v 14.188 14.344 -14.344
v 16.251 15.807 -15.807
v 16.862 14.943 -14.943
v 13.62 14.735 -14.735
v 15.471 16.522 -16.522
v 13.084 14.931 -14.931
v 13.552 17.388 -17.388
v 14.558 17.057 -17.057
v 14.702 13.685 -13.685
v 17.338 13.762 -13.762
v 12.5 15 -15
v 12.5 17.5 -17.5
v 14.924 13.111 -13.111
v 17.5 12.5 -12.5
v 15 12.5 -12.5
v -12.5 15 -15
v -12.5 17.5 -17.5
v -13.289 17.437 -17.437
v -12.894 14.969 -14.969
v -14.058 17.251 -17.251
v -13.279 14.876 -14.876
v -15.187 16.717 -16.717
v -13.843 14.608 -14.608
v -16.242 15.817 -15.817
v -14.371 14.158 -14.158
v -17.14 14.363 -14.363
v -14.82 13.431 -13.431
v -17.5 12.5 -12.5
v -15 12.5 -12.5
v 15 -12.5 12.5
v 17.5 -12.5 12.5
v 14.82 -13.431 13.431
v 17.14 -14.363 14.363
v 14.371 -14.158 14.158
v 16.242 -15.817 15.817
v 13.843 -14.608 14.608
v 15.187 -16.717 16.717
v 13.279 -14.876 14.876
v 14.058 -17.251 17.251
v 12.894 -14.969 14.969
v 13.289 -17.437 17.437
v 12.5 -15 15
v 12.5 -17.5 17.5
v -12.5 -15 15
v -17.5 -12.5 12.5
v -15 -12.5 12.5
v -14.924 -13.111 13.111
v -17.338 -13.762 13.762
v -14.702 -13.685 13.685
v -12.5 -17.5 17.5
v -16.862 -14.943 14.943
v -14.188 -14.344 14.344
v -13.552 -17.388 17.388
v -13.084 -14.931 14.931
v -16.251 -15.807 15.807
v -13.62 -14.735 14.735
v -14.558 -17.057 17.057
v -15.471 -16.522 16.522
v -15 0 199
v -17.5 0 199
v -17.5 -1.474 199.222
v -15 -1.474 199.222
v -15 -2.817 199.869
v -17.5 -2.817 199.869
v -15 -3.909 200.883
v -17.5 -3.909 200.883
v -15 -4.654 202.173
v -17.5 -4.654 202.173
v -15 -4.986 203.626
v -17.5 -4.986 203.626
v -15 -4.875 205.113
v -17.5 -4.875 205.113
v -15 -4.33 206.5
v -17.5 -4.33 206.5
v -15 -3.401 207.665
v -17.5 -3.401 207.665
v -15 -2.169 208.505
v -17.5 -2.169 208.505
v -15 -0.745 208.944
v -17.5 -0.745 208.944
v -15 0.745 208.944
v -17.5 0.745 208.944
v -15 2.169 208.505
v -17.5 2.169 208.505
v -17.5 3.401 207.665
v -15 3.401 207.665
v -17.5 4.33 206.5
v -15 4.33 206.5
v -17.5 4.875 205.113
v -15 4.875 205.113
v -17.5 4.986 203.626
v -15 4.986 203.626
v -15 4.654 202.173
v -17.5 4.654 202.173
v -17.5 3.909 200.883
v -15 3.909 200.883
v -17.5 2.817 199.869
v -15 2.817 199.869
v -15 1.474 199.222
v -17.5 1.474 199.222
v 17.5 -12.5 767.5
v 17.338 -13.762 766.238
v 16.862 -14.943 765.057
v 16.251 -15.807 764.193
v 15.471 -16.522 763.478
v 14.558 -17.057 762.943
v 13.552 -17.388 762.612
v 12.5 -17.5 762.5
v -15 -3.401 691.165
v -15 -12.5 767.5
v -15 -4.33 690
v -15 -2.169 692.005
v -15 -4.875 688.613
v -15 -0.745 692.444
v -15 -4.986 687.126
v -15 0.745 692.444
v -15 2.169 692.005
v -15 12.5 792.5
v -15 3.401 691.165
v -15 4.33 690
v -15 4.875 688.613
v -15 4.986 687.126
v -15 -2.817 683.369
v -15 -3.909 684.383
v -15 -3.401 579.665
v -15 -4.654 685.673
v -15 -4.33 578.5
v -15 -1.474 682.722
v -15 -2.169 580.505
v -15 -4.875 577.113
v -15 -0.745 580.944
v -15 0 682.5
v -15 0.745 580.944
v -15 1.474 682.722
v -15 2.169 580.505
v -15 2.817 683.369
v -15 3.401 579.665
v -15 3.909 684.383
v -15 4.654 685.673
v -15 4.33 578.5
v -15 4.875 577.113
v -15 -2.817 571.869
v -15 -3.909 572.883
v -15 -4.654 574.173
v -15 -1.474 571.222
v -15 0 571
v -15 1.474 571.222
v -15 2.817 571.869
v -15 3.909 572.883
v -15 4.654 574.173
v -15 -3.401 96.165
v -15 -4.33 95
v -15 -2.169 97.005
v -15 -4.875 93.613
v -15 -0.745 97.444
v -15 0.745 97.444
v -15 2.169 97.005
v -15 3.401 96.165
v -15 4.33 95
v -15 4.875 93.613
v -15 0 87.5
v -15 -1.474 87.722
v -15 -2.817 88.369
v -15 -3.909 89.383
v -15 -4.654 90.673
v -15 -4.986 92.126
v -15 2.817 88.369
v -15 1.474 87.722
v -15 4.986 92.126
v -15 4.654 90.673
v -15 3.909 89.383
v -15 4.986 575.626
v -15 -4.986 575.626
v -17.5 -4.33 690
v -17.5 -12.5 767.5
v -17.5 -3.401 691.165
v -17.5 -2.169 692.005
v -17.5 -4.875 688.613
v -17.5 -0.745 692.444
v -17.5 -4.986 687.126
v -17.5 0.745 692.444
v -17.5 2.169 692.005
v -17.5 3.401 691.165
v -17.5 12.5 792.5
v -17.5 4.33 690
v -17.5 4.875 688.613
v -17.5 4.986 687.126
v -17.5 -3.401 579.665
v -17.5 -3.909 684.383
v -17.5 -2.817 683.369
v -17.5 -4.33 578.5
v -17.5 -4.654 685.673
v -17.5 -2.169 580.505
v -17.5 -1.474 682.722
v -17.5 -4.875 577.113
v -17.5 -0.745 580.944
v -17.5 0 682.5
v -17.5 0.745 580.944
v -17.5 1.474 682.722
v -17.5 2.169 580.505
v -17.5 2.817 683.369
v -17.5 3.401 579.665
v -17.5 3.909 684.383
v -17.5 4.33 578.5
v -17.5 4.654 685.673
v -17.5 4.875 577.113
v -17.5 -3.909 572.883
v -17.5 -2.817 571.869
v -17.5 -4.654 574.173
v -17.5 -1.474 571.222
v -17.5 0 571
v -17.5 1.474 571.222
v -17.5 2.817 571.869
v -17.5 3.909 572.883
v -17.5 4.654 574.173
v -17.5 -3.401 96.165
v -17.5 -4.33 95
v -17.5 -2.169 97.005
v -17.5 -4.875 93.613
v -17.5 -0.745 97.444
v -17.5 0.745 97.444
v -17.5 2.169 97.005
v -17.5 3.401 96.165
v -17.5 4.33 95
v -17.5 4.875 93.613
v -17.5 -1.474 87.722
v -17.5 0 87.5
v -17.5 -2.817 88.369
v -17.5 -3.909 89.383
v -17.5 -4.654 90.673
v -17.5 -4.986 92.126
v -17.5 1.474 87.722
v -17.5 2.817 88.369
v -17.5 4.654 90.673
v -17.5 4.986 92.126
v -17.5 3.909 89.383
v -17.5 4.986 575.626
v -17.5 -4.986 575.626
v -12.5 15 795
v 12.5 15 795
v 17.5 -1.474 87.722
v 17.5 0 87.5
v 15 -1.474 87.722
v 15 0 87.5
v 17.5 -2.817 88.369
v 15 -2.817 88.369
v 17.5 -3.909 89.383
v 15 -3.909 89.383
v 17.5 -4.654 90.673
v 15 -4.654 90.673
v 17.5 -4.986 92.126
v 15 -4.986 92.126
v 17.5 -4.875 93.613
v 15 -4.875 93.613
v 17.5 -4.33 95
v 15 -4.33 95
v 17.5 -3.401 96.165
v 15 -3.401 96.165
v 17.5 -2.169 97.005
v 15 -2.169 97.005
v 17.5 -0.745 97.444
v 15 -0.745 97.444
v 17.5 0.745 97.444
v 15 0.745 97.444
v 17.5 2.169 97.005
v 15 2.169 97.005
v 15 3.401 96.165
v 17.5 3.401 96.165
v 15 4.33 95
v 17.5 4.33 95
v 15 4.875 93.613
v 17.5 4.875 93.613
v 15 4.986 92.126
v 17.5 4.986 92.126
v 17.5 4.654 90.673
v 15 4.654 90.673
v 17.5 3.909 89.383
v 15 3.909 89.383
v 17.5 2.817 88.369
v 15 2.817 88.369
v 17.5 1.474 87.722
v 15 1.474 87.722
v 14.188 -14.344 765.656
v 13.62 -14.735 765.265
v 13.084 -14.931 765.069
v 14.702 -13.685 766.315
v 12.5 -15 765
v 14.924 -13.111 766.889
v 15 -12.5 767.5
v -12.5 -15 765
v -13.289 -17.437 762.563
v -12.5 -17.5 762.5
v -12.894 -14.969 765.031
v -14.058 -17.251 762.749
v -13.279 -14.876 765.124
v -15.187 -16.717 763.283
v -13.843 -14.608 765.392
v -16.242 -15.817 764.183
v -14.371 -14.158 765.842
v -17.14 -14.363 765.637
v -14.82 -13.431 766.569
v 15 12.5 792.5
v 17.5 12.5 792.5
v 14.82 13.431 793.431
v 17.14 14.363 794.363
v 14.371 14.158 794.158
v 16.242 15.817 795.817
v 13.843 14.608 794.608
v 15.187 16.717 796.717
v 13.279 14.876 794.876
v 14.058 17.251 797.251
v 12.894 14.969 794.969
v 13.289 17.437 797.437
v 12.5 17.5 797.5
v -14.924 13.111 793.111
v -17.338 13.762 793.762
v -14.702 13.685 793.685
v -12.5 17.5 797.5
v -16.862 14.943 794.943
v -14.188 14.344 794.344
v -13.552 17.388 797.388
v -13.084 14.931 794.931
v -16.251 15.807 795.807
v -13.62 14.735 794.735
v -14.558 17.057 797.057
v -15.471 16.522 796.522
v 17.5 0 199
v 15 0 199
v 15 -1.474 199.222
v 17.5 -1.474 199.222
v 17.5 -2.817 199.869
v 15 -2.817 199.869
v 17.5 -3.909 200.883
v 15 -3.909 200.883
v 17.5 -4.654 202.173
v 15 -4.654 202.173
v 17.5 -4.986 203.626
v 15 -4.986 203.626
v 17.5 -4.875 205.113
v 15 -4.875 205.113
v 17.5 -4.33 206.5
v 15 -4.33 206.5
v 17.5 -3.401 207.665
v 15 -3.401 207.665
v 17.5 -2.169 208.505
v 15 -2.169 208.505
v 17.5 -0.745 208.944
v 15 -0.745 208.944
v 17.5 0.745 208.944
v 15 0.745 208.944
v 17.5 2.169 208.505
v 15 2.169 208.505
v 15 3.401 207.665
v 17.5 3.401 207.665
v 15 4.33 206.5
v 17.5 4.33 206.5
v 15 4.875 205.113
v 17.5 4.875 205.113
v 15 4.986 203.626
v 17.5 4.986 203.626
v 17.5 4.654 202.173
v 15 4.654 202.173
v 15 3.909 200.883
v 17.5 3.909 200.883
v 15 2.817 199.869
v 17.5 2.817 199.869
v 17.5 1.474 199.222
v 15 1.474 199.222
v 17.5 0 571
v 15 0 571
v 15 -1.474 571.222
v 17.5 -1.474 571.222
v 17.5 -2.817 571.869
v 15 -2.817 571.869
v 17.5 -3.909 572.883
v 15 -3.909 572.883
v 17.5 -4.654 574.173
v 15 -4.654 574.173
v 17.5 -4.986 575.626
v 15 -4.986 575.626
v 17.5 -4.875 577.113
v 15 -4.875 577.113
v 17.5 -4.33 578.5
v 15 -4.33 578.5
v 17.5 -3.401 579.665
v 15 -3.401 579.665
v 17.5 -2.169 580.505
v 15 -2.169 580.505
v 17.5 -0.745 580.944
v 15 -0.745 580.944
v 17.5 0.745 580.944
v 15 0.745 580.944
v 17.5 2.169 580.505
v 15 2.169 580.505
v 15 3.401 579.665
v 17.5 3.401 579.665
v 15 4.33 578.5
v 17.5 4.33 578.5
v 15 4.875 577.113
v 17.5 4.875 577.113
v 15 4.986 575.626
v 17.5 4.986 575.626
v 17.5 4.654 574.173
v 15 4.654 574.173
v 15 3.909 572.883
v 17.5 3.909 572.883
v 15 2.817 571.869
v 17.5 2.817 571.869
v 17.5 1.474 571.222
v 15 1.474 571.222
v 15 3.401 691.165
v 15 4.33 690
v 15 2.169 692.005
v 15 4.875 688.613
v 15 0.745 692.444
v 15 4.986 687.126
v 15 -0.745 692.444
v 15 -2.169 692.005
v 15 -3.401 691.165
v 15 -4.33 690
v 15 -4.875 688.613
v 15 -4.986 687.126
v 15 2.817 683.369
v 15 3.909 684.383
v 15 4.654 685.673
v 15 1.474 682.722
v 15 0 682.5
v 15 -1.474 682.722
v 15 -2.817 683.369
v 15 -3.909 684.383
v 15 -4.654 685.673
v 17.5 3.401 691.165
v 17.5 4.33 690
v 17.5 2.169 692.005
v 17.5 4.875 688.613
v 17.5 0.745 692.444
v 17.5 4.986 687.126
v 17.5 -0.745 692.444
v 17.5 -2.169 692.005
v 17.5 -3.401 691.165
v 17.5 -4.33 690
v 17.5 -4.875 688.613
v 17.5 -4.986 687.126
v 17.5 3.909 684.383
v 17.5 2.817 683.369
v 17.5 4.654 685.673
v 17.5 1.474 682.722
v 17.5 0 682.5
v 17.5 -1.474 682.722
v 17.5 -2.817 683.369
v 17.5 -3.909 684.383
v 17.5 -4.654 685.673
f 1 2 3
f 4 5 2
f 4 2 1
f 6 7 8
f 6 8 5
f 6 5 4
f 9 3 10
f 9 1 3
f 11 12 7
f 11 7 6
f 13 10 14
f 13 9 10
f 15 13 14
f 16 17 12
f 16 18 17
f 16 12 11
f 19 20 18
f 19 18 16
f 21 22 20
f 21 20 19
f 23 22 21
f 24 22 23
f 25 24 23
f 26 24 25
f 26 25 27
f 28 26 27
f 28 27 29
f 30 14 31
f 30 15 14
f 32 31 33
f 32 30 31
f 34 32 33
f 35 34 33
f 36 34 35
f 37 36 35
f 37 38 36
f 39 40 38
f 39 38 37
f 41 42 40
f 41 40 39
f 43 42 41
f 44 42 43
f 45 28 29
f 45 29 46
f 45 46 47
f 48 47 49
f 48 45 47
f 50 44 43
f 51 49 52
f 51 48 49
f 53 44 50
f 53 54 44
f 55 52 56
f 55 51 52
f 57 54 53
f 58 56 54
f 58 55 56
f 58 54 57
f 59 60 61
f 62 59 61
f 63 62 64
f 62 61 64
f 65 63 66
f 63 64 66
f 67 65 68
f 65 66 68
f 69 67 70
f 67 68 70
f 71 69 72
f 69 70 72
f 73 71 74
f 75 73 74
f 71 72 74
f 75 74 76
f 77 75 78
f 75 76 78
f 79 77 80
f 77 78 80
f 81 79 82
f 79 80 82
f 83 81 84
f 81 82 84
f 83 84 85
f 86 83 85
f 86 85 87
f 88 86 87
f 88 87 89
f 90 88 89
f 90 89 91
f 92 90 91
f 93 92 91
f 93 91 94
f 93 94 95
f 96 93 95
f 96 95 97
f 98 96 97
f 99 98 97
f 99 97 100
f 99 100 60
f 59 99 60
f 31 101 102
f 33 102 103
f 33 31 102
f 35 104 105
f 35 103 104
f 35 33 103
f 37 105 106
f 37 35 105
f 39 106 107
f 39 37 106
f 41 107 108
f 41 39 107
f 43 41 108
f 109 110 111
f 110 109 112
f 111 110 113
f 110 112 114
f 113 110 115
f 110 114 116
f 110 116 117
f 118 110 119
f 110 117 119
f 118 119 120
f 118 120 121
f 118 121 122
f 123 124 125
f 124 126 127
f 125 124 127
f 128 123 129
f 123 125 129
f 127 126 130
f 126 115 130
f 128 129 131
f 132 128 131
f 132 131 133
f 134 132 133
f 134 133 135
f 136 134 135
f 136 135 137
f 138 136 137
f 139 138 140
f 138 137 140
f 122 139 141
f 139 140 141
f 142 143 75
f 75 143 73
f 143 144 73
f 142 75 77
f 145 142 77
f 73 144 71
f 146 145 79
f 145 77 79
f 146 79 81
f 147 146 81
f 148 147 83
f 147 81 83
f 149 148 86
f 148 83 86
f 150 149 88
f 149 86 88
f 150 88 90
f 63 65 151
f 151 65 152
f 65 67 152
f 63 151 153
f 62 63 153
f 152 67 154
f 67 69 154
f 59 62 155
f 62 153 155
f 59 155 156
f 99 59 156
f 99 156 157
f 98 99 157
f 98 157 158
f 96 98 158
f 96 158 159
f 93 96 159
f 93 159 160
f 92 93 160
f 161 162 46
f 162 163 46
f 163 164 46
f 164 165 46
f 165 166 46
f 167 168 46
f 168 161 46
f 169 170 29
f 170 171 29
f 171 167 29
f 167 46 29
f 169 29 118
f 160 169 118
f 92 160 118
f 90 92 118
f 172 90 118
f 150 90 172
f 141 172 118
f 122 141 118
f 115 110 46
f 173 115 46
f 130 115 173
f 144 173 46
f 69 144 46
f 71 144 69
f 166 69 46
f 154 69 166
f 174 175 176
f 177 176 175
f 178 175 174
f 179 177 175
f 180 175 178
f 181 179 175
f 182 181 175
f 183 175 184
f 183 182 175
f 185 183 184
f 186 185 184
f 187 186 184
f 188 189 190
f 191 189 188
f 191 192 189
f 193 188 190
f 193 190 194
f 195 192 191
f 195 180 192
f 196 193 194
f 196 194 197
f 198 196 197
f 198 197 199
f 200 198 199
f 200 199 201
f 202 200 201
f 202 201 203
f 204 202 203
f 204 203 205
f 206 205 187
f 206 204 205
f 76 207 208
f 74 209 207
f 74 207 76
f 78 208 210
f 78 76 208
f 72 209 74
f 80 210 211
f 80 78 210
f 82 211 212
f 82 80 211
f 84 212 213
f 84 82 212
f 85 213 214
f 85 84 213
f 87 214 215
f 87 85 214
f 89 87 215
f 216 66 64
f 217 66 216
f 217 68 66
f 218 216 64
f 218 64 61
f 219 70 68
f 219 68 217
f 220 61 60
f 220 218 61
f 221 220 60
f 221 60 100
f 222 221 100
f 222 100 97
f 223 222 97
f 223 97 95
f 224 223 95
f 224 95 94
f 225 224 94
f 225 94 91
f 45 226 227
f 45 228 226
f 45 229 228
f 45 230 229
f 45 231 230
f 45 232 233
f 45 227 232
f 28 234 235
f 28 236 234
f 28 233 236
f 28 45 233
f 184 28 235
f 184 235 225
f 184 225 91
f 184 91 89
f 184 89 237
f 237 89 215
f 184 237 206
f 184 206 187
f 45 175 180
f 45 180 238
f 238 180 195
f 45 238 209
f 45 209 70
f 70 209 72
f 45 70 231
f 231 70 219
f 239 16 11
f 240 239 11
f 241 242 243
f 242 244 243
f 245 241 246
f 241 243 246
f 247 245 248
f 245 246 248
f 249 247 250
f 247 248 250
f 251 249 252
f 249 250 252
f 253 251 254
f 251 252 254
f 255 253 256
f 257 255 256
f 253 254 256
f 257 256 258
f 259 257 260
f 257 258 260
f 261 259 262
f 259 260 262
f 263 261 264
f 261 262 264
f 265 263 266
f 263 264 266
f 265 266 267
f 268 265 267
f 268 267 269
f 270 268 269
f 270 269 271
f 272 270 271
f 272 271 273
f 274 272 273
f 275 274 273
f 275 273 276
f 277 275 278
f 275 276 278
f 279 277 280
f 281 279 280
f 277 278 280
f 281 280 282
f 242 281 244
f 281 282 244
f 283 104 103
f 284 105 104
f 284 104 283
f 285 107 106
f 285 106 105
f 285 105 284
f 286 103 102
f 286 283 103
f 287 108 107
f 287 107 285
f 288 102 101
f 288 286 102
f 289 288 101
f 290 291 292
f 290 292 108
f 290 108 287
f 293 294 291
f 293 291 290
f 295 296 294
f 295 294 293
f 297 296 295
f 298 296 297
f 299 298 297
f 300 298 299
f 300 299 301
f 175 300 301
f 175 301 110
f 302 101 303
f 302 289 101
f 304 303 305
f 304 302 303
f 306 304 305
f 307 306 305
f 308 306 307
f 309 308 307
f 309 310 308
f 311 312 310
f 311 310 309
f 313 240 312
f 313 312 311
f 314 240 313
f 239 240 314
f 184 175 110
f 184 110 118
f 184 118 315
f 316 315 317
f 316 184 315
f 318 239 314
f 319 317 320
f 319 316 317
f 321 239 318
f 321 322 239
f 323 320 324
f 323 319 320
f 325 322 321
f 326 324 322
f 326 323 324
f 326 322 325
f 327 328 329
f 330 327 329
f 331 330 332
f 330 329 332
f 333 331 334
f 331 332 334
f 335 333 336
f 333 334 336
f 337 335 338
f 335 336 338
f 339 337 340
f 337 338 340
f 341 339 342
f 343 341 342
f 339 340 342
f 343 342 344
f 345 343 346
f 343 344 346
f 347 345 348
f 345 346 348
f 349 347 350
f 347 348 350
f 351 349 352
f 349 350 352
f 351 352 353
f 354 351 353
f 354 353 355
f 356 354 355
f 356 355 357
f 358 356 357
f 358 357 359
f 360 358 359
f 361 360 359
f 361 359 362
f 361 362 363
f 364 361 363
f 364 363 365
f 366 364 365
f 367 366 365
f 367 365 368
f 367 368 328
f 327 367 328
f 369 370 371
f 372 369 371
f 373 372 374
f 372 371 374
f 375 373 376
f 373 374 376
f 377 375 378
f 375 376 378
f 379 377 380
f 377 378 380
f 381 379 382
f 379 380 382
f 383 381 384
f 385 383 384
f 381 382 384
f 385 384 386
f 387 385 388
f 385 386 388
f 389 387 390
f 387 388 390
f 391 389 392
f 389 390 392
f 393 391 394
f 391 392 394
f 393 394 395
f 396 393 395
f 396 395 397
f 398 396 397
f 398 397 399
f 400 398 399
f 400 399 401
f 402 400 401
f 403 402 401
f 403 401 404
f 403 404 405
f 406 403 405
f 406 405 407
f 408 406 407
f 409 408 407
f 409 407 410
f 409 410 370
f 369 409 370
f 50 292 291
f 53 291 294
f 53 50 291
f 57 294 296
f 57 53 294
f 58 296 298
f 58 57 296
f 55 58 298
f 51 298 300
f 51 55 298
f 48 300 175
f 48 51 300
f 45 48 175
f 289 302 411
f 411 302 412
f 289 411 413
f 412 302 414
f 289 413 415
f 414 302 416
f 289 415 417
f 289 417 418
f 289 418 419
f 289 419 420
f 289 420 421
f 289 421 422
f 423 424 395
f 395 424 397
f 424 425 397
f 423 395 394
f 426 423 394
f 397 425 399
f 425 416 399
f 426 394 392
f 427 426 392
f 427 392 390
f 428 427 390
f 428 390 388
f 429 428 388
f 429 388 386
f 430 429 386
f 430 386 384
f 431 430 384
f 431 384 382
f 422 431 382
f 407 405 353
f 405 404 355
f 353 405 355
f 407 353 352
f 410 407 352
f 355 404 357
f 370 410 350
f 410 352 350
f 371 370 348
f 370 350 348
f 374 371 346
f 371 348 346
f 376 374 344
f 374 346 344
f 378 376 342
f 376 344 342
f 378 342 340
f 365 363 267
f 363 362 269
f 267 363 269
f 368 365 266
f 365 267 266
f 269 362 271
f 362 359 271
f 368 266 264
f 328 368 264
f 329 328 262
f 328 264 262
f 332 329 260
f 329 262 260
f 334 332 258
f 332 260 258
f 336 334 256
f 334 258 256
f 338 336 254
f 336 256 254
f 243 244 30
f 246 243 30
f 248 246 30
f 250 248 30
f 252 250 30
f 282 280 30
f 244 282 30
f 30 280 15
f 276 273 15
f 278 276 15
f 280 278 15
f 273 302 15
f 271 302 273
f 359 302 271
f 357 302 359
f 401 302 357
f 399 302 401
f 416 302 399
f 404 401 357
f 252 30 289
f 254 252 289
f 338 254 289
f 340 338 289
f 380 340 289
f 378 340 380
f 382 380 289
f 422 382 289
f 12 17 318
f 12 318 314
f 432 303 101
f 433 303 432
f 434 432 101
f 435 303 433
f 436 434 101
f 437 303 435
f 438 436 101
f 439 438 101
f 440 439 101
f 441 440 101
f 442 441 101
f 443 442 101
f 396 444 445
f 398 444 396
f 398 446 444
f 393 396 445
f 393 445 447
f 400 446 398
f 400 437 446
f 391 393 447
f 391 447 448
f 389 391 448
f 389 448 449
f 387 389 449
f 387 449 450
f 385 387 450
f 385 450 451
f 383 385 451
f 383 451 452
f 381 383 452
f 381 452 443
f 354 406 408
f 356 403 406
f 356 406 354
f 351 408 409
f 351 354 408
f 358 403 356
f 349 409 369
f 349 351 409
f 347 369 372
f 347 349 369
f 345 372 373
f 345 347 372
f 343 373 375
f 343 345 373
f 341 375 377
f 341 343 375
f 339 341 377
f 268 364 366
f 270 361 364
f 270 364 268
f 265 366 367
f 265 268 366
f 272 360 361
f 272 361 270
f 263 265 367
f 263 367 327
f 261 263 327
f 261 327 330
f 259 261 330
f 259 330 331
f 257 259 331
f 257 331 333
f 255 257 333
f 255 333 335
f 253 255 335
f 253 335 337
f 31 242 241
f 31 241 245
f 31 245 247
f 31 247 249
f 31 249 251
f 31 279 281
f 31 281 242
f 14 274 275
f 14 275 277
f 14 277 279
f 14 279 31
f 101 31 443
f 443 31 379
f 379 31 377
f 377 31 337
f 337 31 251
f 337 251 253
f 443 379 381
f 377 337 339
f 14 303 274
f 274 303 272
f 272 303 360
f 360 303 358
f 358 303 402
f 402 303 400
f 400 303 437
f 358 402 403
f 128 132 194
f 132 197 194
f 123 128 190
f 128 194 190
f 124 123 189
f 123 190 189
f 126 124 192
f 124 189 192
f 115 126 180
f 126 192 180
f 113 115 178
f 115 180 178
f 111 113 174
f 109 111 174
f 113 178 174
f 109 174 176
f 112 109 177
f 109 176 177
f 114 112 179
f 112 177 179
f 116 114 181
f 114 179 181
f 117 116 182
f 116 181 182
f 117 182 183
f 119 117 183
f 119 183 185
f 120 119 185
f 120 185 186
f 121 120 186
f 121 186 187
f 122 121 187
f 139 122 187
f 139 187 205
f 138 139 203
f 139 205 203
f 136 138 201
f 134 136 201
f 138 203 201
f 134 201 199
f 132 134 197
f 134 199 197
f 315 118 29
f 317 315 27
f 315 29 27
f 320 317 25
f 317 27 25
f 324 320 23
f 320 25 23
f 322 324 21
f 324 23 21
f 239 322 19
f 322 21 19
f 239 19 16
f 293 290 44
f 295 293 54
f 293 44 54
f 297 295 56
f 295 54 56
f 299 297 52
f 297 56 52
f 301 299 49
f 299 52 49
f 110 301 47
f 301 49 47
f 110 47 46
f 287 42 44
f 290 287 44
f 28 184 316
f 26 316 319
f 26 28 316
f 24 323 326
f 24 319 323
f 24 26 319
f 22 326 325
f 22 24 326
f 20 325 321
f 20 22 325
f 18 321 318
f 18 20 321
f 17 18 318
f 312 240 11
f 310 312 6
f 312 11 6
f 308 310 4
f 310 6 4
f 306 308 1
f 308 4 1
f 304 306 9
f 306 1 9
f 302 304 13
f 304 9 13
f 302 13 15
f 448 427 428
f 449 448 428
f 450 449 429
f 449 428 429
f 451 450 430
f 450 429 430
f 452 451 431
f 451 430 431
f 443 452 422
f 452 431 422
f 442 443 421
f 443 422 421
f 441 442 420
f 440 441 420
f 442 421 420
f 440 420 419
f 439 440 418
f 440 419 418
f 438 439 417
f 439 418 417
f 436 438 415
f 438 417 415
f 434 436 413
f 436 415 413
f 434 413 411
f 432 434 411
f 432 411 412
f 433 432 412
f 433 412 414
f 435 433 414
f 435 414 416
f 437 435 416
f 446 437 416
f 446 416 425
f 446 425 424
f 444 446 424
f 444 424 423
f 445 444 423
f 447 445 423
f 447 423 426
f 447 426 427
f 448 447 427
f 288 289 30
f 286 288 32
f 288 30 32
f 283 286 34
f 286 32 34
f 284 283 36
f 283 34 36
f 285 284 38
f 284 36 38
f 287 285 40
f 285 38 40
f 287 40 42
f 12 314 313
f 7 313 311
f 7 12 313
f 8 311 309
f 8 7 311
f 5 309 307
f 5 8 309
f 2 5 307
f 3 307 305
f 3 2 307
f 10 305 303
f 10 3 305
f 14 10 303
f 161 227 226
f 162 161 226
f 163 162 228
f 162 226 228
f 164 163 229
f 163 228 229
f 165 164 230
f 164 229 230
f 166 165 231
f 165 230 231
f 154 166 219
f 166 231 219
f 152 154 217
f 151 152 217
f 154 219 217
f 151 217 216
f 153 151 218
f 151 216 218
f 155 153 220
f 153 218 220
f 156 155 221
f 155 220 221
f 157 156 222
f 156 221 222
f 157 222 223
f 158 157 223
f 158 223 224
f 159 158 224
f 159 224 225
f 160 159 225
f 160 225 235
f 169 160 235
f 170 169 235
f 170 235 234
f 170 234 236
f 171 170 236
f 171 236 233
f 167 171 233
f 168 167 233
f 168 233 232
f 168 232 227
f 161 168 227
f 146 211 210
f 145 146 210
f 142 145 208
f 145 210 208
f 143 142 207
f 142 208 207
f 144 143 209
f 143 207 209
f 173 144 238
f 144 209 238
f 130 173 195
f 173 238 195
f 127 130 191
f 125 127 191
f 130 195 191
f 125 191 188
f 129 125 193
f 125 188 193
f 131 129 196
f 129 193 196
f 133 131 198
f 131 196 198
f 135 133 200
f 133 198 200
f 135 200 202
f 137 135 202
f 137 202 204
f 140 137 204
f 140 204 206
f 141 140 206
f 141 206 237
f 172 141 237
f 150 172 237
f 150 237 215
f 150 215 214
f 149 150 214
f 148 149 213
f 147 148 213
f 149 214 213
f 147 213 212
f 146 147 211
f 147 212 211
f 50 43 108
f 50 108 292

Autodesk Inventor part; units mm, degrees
ref_plane "Start plane" through (0, 0, -17.5) normal (0, 0, 1) x (1, 0, 0)
ref_plane "End plane" through (0, 0, 797.5) normal (0, 0, 1) x (1, 0, 0)
sketch "Sketch" plane through (0, 0, 0) normal (0, 0, 1) x (1, 0, 0)
  line L0 (-17.5, -12.5) -> (-17.5, 12.5)
  line L1 (-12.5, 17.5) -> (12.5, 17.5)
  line L2 (17.5, 12.5) -> (17.5, -12.5)
  line L3 (12.5, -17.5) -> (-12.5, -17.5)
  arc A0 (-17.5, -12.5) -> (-12.5, -17.5) centre (-12.5, -12.5) ccw
  arc A1 (-12.5, 17.5) -> (-17.5, 12.5) centre (-12.5, 12.5) ccw
  arc A2 (17.5, 12.5) -> (12.5, 17.5) centre (12.5, 12.5) ccw
  arc A3 (12.5, -17.5) -> (17.5, -12.5) centre (12.5, -12.5) ccw
  arc A4 (-12.5, 15) -> (-15, 12.5) centre (-12.5, 12.5) ccw
  line L4 (-12.5, 15) -> (12.5, 15)
  arc A5 (15, 12.5) -> (12.5, 15) centre (12.5, 12.5) ccw
  line L5 (15, 12.5) -> (15, -12.5)
  arc A6 (12.5, -15) -> (15, -12.5) centre (12.5, -12.5) ccw
  line L6 (12.5, -15) -> (-12.5, -15)
  arc A7 (-15, -12.5) -> (-12.5, -15) centre (-12.5, -12.5) ccw
  line L7 (-15, -12.5) -> (-15, 12.5)
  line L8 (0, 25.9497) -> (0, -25.9497) construction
  line L9 (-25.9497, 0) -> (25.9497, 0) construction
  dimension "d7" = 5
  dimension "d10" = 35
  dimension "d11" = 35
  dimension "d12" = 2.5
  dimension "d15" = 17.5
  dimension "d16" = 17.5
extrude "Body" add sketch "Sketch" along normal up to surface (815 mm away) from surface at -17.5
sketch "Sketch3" plane through (0, 0, 0) normal (0, 0, 1) x (1, 0, 0)
  line L0 (0, 0) -> (10, 0)
ref_plane "Work Plane3" through (0, 0, 0) normal (0, -1, 0) x (1, 0, 0)
sketch "Sketch4" plane through (0, 0, 0) normal (0, -1, 0) x (1, 0, 0)
  line L0 (-2, -17.5) -> (12, -17.5)
  line L1 (-2, 797.5) -> (12, 797.5)
  dimension "d18" = 815
ref_plane "Work Plane4" through (-17.5, 0, -17.5) normal (0, 0, -1) x (-1, 0, 0)
split "Split1" plane through (-17.5, 0, -17.5) removes the side toward (0, 0, -1)
ref_plane "Work Plane5" through (-107.5, 0, 797.5) normal (0, 0, 1) x (1, 0, 0)
split "Split2" plane through (-107.5, 0, 797.5) removes the side toward (0, 0, 1)
ref_plane "Work Plane6" through (0, 17.5, -17.5) normal (0, -0.7071, -0.7071) x (1, 0, 0)
split "Split3" plane through (0, 17.5, -17.5) removes the side toward (0, -0.7071, -0.7071)
ref_plane "Work Plane8" through (0, 17.5, 797.5) normal (0, -0.7071, 0.7071) x (1, 0, 0)
split "Split5" plane through (0, 17.5, 797.5) removes the side toward (0, -0.7071, 0.7071)
sketch "Sketch5" plane through (17.5, 12.5, 792.5) normal (1, 0, 0) x (0, 0, -1)
  line L0 (0, 0) -> (25, -25) construction
  line L1 (25, -25) -> (780, -25) construction
  line L2 (780, -25) -> (805, 0) construction
  line L3 (0, 0) -> (805, 0) construction
  line L4 (30, -475) -> (30, -30) construction
  line L5 (775, -30) -> (775, -95) construction
  line L6 (105, 0) -> (105, -25) construction
  line L7 (25, -25) -> (780, -25) construction
  line L8 (216.5, 0) -> (216.5, -25) construction
  line L9 (105, -12.5) -> (216.5, -12.5) construction
  line L10 (700, 0) -> (700, -25) construction
  line L11 (0, 0) -> (805, 0) construction
  line L12 (588.5, 0) -> (588.5, -25) construction
  line L13 (588.5, -12.5) -> (700, -12.5) construction
  point P0 (792.5, -12.5)
  point P1 (15, 0)
  dimension "d19" = 75
  dimension "d20" = 111.5
  dimension "d21" = 75
  dimension "d22" = 111.5
hole "Hole1" at (17.5, 0, 687.5) at (17.5, 0, 576) at (17.5, 0, 204) at (17.5, 0, 92.5) direction (-1, 0, 0) diameter 10 end through all
equation "\"d7\" = G_IR"
equation "\"d10\" = G_H"
equation "\"d11\" = G_W"
equation "\"d12\" = G_T"
equation "\"d15\" = 0.5 * d10"
equation "\"d16\" = 0.5 * d11"
equation "\"d3\" = G_L"
equation "\"G_W\" = 35"
equation "\"G_H\" = 35"
equation "\"G_T\" = 2.5"
equation "\"G_IR\" = 5"
equation "\"G_L\" = d18"
equation "\"G_OFFSET_START\" = 17.5"
equation "\"G_OFFSET_END\" = 17.5"
equation "\"d13\" = -G_OFFSET_START"
equation "\"d14\" = G_OFFSET_END + B_L"
equation "\"B_L\" = 780"
properties part number "AS 1163 - C350L0 35x35x2.5 SHS - 815" material "Steel, Mild"
